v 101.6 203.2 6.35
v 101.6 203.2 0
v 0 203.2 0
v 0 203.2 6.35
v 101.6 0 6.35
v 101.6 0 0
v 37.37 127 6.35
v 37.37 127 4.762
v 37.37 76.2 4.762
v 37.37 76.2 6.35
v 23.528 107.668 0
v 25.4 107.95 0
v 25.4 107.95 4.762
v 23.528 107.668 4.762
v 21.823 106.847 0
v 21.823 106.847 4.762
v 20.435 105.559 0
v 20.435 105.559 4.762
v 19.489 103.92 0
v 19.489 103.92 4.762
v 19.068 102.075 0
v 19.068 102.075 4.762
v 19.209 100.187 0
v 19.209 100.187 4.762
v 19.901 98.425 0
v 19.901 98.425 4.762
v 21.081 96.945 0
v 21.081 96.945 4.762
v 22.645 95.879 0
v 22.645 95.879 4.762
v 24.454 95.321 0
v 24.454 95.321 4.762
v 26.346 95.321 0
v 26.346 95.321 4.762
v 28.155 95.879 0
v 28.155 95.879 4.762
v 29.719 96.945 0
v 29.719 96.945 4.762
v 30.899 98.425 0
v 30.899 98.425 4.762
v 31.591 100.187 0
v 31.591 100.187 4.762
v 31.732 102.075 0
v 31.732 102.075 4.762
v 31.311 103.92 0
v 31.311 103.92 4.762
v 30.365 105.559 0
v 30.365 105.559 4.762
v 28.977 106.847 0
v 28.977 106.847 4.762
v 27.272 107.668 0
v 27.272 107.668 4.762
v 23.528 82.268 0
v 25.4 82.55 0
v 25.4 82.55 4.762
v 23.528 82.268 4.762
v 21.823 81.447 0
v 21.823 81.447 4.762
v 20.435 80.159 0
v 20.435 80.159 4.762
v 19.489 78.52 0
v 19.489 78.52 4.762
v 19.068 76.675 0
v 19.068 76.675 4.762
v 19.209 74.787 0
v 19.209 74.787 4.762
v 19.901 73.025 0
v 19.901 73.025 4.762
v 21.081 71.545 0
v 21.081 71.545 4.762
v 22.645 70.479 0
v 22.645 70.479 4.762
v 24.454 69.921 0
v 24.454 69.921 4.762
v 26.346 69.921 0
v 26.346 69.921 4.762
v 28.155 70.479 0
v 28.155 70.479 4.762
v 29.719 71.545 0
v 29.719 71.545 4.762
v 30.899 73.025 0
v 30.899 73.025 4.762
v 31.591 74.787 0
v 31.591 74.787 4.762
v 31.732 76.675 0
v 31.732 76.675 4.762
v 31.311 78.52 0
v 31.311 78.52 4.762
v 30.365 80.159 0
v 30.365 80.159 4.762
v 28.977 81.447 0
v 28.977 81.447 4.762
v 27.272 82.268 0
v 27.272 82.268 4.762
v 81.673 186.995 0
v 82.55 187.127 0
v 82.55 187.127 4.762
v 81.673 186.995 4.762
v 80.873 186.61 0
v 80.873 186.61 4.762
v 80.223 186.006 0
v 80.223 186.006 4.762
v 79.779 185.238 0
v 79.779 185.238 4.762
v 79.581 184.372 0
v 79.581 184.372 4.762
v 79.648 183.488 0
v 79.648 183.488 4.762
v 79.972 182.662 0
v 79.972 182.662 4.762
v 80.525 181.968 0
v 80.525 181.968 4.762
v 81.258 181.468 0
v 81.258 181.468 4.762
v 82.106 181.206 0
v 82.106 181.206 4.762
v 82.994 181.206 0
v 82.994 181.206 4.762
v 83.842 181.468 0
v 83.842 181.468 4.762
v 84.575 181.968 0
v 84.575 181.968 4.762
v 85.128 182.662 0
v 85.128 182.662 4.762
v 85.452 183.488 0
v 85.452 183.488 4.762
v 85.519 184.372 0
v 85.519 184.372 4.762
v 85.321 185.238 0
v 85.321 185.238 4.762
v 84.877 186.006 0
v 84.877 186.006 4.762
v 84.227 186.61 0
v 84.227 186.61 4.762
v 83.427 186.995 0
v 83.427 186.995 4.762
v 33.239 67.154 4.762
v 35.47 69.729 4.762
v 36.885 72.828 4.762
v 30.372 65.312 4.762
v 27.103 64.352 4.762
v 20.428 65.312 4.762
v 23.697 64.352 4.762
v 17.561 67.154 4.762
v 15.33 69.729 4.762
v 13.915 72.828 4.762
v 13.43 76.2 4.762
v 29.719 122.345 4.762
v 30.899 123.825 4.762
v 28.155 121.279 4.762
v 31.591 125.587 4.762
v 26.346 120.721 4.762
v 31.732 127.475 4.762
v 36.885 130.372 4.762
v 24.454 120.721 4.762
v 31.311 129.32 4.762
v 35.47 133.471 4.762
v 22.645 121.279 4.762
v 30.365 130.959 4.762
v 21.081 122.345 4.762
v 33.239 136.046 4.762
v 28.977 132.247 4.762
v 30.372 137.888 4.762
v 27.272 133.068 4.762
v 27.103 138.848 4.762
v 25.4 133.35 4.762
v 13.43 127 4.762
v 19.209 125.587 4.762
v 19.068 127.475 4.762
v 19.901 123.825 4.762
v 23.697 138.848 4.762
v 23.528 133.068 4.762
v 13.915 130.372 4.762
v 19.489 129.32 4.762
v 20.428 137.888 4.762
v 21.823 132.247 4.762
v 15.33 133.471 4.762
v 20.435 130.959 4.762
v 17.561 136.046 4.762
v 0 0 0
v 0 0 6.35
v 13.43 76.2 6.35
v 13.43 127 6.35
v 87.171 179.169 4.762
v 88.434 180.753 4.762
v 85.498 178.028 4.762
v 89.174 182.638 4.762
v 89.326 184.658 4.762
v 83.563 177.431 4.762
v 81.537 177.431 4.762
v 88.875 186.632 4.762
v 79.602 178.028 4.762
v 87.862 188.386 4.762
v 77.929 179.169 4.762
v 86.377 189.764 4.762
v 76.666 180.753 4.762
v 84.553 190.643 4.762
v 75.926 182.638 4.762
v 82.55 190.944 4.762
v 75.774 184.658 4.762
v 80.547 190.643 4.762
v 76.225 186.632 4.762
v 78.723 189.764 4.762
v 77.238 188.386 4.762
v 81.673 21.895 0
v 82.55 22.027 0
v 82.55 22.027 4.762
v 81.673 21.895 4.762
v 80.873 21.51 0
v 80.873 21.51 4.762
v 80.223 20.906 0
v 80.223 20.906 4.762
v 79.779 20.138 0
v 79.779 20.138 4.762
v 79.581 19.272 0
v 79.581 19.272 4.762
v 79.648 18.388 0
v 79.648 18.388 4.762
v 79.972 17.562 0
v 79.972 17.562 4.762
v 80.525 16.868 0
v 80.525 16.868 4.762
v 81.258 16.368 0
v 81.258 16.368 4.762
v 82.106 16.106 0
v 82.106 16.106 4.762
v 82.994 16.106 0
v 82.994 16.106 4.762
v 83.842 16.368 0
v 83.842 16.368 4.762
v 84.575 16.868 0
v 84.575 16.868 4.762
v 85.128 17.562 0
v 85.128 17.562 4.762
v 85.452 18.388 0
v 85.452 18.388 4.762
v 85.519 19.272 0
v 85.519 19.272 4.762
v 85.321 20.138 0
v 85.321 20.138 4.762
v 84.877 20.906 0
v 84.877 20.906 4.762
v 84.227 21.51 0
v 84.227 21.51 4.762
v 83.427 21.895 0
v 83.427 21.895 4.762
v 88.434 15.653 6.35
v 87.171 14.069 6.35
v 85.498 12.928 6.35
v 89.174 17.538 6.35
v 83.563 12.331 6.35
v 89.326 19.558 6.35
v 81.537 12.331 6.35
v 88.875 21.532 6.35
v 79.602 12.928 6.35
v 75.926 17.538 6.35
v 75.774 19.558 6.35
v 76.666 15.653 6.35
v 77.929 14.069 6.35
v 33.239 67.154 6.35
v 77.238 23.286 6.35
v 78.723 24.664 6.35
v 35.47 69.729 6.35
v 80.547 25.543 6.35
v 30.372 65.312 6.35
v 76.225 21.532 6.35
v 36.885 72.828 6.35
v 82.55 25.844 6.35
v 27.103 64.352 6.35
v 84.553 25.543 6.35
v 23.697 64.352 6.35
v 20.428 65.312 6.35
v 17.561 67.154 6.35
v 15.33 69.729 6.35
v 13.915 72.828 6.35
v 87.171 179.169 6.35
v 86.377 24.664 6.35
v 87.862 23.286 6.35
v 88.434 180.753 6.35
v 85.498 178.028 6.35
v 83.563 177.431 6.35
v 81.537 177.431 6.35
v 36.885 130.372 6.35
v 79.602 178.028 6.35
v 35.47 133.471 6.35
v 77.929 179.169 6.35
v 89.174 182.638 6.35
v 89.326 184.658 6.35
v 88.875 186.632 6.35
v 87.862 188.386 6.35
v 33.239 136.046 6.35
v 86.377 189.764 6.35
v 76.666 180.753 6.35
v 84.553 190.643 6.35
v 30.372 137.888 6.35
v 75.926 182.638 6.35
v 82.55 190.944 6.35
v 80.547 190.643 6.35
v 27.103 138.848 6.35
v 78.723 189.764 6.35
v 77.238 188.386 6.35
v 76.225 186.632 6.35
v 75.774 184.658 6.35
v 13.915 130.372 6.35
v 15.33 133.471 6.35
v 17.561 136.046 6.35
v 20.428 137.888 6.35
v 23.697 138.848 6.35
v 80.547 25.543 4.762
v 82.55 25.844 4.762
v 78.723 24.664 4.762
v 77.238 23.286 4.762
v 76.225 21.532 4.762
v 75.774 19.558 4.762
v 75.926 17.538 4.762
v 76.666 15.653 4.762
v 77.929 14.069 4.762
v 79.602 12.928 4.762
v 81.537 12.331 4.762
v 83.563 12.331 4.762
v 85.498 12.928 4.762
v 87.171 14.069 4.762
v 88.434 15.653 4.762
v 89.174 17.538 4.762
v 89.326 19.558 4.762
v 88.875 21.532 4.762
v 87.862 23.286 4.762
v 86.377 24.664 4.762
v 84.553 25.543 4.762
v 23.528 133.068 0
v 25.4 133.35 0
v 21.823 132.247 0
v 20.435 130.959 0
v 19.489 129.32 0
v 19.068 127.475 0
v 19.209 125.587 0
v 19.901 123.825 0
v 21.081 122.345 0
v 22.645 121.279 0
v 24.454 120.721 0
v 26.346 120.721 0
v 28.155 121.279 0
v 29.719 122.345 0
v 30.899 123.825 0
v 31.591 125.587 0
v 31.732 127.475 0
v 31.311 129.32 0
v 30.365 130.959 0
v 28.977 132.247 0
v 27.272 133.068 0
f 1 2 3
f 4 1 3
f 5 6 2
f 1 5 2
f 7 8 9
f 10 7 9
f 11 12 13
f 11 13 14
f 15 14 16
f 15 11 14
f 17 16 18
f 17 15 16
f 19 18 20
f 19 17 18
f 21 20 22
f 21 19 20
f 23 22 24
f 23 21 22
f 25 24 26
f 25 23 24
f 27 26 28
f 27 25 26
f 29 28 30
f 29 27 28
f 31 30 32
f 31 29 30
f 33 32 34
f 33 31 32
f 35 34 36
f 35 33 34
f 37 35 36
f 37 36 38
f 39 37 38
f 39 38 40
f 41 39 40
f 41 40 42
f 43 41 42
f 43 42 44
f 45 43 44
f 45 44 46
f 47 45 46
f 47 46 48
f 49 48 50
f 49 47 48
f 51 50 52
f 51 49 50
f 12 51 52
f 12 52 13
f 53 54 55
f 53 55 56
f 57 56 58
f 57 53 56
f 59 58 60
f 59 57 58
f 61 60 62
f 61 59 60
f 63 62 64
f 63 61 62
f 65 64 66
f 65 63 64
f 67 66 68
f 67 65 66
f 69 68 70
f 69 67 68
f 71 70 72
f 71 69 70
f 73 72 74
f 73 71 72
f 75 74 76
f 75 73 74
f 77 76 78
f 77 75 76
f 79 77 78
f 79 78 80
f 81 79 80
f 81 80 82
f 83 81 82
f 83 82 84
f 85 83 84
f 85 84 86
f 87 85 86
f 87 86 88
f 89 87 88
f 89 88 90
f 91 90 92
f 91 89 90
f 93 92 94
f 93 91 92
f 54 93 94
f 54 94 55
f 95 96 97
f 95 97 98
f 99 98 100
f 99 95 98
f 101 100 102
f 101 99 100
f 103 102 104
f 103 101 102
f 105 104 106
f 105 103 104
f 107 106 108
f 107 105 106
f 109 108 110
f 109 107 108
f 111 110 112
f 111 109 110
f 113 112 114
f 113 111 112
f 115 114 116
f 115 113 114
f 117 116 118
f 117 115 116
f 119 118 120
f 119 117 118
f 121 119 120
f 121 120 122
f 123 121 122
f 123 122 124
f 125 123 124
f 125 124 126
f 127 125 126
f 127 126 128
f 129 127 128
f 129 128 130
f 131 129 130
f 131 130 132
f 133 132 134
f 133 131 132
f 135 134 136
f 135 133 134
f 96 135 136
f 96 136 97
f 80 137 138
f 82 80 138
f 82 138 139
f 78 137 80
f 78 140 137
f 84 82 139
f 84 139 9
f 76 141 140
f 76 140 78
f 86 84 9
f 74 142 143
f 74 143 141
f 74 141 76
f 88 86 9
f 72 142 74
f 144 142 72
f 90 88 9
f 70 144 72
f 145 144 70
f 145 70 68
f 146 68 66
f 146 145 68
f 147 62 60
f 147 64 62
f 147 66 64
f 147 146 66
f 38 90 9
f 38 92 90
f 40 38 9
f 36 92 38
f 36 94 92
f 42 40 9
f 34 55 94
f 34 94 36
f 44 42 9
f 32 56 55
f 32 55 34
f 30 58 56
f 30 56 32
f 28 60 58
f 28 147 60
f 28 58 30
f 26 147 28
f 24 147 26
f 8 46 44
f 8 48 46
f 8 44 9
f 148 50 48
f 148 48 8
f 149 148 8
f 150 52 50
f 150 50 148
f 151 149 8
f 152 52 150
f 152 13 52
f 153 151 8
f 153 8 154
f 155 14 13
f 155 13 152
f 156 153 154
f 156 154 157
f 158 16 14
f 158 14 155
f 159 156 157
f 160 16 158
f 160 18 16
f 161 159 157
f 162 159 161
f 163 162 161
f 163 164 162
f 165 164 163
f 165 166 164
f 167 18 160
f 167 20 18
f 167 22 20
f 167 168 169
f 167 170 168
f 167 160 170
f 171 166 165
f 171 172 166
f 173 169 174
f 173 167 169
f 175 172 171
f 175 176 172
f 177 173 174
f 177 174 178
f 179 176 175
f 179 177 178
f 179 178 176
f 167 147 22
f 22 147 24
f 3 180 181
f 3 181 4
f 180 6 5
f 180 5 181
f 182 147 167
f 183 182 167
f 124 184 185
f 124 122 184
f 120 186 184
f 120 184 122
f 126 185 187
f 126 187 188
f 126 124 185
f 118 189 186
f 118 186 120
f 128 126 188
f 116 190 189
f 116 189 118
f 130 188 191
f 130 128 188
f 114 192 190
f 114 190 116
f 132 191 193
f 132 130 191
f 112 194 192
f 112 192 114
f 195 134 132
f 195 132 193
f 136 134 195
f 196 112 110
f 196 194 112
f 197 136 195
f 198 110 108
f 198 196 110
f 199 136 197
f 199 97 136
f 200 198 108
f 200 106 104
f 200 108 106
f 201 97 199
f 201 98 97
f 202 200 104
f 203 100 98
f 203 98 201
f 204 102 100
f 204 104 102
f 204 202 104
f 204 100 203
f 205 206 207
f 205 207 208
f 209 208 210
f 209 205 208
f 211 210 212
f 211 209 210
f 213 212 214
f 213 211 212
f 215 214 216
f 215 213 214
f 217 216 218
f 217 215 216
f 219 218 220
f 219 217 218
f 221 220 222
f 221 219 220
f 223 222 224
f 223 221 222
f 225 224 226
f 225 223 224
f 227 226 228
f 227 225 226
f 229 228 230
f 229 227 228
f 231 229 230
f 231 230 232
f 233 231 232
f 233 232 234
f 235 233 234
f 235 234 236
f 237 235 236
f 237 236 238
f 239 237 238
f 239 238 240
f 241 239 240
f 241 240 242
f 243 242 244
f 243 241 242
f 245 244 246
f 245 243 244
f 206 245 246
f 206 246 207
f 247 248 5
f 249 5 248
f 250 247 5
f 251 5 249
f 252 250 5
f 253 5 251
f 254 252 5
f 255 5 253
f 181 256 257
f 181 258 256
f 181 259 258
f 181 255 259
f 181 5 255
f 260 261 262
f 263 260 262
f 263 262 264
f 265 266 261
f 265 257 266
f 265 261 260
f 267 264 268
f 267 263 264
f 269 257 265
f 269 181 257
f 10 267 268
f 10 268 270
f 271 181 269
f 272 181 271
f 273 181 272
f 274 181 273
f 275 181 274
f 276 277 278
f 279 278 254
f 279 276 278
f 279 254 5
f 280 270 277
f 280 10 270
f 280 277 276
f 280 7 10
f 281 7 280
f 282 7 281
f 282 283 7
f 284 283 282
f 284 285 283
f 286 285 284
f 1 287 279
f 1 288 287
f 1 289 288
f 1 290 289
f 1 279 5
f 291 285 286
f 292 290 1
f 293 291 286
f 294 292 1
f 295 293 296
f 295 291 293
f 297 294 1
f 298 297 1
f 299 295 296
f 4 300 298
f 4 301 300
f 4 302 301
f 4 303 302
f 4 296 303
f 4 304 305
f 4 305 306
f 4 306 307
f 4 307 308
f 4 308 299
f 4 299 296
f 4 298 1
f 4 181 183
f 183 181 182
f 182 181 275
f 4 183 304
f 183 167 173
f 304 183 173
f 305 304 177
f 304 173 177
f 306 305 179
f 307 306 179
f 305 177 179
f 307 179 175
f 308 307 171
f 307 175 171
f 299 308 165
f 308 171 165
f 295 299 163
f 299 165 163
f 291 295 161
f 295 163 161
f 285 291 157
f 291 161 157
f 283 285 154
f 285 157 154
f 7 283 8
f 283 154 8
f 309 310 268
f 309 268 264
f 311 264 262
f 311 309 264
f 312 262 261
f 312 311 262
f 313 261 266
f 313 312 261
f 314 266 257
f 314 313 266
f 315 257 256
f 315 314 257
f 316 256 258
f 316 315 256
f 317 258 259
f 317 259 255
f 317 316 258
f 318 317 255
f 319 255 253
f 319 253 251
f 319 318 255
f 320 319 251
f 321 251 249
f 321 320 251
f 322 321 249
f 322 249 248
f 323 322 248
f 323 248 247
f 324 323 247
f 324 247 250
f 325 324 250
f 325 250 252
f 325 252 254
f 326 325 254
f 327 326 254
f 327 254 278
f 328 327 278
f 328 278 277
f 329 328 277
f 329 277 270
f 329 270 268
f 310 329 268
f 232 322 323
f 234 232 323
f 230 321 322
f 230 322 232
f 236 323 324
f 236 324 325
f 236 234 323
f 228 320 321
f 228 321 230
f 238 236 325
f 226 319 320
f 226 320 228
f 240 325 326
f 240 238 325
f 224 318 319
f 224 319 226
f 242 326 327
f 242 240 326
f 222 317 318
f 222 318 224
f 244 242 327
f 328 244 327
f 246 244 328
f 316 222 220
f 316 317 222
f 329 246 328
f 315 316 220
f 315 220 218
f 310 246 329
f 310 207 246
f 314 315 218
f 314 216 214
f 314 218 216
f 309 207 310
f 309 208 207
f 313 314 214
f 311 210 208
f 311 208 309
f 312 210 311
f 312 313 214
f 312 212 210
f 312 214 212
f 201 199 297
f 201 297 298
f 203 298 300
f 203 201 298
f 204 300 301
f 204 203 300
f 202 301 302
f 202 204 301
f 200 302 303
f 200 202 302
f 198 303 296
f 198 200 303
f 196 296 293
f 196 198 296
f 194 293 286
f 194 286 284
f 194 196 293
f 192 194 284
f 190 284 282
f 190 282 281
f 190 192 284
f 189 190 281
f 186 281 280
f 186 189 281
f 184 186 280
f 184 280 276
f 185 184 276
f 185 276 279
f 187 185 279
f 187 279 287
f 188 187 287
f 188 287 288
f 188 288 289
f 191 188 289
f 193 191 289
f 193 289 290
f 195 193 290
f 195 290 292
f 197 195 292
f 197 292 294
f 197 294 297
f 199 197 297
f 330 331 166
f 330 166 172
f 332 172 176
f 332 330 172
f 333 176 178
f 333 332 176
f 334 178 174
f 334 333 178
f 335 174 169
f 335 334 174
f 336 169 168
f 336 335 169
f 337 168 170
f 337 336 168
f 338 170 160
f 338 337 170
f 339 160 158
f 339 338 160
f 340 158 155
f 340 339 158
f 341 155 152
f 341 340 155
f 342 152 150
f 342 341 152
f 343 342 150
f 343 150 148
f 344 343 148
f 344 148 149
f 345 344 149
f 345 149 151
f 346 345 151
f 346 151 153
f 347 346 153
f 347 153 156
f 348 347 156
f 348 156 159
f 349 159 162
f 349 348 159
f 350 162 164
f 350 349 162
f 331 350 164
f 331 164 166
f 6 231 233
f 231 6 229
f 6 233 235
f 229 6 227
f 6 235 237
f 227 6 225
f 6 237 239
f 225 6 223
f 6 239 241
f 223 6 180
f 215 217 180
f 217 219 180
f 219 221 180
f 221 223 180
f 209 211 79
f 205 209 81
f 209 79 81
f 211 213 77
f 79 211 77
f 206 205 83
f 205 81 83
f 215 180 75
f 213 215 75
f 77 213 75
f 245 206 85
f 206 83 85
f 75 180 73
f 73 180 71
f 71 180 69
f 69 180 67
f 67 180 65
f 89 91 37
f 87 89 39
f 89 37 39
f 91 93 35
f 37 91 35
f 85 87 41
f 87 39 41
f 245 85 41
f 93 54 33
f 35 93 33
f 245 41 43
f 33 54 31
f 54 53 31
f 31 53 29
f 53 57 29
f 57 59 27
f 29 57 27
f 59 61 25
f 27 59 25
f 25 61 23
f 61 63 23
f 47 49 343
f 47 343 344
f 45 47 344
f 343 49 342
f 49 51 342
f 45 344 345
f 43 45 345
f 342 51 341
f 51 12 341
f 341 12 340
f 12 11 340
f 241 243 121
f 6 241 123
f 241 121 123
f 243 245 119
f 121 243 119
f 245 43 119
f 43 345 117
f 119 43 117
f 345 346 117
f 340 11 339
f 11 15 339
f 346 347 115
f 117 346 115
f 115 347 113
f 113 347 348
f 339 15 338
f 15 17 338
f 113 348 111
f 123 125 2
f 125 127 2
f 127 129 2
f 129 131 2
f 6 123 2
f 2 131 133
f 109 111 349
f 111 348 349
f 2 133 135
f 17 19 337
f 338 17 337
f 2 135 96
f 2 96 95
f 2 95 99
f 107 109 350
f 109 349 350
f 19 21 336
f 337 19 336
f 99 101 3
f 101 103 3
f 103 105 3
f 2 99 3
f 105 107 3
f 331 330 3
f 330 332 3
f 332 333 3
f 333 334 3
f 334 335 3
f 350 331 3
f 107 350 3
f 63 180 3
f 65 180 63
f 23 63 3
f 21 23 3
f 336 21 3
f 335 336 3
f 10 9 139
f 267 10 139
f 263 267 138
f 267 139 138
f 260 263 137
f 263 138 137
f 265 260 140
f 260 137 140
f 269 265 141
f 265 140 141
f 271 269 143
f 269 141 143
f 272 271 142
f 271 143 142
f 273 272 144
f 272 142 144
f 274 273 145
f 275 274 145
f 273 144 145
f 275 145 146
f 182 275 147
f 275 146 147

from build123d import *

# Parameters (mm, degrees)
F0_R     = 6.35
F1_DEPTH = 4.7625
F0_W     = 203.2
F0_H     = 101.6
F0_R_2   = 6.7945
F2_DEPTH = 6.35
F0_R_3   = 2.97688
F3_DEPTH = 4.7625
F4_DEPTH = 4.7625
F5_ANGLE = 270


with BuildPart() as f1:
    # F0 (on Top) → F1 (new body)
    with BuildSketch(Plane.XY):
        with BuildLine():
            Line((127, 88.16975), (76.2, 88.16975))
            ThreePointArc((76.2, 88.16975), (64.23025, 76.2), (76.2, 64.23025))
            Line((76.2, 64.23025), (127, 64.23025))
            ThreePointArc((127, 64.23025), (138.96975, 76.2), (127, 88.16975))
        make_face()
        with Locations((76.2, 76.2)):
            Circle(F0_R, mode=Mode.SUBTRACT)
        with Locations((101.6, 76.2)):
            Circle(F0_R, mode=Mode.SUBTRACT)
        with Locations((127, 76.2)):
            Circle(F0_R, mode=Mode.SUBTRACT)
    extrude(amount=F1_DEPTH)

    # F0 (on Top) → F2 (join)
    with BuildSketch(Plane.XY):
        with Locations((101.6, 50.8)):
            Rectangle(F0_W, F0_H)
        with Locations((19.05, 19.05)):
            Circle(F0_R_2, mode=Mode.SUBTRACT)
        with Locations((184.15, 19.05)):
            Circle(F0_R_2, mode=Mode.SUBTRACT)
        with BuildLine():
            ThreePointArc((76.2, 64.23025), (64.23025, 76.2), (76.2, 88.16975))
            Line((76.2, 88.16975), (127, 88.16975))
            ThreePointArc((127, 88.16975), (138.96975, 76.2), (127, 64.23025))
            Line((127, 64.23025), (76.2, 64.23025))
        make_face(mode=Mode.SUBTRACT)
    extrude(amount=F2_DEPTH)

    # F0 (on Top) → F3 (join)
    with BuildSketch(Plane.XY):
        with Locations((19.05, 19.05)):
            Circle(F0_R_2)
        with Locations((19.05, 19.05)):
            Circle(F0_R_3, mode=Mode.SUBTRACT)
    extrude(amount=F3_DEPTH)

    # F0 (on Top) → F4 (join)
    with BuildSketch(Plane.XY):
        with Locations((184.15, 19.05)):
            Circle(F0_R_2)
        with Locations((184.15, 19.05)):
            Circle(F0_R_3, mode=Mode.SUBTRACT)
    extrude(amount=F4_DEPTH)


with BuildPart() as f1_1:
    # F5: moved
    add(f1.part.rotate(Axis((0, 0, 3.175), (0, 0, -1)), F5_ANGLE))


with BuildPart() as f1_2:
    # F6: moved
    add(f1_1.part.moved(Location((101.6, 0, 0))))


solid = f1_2.part
